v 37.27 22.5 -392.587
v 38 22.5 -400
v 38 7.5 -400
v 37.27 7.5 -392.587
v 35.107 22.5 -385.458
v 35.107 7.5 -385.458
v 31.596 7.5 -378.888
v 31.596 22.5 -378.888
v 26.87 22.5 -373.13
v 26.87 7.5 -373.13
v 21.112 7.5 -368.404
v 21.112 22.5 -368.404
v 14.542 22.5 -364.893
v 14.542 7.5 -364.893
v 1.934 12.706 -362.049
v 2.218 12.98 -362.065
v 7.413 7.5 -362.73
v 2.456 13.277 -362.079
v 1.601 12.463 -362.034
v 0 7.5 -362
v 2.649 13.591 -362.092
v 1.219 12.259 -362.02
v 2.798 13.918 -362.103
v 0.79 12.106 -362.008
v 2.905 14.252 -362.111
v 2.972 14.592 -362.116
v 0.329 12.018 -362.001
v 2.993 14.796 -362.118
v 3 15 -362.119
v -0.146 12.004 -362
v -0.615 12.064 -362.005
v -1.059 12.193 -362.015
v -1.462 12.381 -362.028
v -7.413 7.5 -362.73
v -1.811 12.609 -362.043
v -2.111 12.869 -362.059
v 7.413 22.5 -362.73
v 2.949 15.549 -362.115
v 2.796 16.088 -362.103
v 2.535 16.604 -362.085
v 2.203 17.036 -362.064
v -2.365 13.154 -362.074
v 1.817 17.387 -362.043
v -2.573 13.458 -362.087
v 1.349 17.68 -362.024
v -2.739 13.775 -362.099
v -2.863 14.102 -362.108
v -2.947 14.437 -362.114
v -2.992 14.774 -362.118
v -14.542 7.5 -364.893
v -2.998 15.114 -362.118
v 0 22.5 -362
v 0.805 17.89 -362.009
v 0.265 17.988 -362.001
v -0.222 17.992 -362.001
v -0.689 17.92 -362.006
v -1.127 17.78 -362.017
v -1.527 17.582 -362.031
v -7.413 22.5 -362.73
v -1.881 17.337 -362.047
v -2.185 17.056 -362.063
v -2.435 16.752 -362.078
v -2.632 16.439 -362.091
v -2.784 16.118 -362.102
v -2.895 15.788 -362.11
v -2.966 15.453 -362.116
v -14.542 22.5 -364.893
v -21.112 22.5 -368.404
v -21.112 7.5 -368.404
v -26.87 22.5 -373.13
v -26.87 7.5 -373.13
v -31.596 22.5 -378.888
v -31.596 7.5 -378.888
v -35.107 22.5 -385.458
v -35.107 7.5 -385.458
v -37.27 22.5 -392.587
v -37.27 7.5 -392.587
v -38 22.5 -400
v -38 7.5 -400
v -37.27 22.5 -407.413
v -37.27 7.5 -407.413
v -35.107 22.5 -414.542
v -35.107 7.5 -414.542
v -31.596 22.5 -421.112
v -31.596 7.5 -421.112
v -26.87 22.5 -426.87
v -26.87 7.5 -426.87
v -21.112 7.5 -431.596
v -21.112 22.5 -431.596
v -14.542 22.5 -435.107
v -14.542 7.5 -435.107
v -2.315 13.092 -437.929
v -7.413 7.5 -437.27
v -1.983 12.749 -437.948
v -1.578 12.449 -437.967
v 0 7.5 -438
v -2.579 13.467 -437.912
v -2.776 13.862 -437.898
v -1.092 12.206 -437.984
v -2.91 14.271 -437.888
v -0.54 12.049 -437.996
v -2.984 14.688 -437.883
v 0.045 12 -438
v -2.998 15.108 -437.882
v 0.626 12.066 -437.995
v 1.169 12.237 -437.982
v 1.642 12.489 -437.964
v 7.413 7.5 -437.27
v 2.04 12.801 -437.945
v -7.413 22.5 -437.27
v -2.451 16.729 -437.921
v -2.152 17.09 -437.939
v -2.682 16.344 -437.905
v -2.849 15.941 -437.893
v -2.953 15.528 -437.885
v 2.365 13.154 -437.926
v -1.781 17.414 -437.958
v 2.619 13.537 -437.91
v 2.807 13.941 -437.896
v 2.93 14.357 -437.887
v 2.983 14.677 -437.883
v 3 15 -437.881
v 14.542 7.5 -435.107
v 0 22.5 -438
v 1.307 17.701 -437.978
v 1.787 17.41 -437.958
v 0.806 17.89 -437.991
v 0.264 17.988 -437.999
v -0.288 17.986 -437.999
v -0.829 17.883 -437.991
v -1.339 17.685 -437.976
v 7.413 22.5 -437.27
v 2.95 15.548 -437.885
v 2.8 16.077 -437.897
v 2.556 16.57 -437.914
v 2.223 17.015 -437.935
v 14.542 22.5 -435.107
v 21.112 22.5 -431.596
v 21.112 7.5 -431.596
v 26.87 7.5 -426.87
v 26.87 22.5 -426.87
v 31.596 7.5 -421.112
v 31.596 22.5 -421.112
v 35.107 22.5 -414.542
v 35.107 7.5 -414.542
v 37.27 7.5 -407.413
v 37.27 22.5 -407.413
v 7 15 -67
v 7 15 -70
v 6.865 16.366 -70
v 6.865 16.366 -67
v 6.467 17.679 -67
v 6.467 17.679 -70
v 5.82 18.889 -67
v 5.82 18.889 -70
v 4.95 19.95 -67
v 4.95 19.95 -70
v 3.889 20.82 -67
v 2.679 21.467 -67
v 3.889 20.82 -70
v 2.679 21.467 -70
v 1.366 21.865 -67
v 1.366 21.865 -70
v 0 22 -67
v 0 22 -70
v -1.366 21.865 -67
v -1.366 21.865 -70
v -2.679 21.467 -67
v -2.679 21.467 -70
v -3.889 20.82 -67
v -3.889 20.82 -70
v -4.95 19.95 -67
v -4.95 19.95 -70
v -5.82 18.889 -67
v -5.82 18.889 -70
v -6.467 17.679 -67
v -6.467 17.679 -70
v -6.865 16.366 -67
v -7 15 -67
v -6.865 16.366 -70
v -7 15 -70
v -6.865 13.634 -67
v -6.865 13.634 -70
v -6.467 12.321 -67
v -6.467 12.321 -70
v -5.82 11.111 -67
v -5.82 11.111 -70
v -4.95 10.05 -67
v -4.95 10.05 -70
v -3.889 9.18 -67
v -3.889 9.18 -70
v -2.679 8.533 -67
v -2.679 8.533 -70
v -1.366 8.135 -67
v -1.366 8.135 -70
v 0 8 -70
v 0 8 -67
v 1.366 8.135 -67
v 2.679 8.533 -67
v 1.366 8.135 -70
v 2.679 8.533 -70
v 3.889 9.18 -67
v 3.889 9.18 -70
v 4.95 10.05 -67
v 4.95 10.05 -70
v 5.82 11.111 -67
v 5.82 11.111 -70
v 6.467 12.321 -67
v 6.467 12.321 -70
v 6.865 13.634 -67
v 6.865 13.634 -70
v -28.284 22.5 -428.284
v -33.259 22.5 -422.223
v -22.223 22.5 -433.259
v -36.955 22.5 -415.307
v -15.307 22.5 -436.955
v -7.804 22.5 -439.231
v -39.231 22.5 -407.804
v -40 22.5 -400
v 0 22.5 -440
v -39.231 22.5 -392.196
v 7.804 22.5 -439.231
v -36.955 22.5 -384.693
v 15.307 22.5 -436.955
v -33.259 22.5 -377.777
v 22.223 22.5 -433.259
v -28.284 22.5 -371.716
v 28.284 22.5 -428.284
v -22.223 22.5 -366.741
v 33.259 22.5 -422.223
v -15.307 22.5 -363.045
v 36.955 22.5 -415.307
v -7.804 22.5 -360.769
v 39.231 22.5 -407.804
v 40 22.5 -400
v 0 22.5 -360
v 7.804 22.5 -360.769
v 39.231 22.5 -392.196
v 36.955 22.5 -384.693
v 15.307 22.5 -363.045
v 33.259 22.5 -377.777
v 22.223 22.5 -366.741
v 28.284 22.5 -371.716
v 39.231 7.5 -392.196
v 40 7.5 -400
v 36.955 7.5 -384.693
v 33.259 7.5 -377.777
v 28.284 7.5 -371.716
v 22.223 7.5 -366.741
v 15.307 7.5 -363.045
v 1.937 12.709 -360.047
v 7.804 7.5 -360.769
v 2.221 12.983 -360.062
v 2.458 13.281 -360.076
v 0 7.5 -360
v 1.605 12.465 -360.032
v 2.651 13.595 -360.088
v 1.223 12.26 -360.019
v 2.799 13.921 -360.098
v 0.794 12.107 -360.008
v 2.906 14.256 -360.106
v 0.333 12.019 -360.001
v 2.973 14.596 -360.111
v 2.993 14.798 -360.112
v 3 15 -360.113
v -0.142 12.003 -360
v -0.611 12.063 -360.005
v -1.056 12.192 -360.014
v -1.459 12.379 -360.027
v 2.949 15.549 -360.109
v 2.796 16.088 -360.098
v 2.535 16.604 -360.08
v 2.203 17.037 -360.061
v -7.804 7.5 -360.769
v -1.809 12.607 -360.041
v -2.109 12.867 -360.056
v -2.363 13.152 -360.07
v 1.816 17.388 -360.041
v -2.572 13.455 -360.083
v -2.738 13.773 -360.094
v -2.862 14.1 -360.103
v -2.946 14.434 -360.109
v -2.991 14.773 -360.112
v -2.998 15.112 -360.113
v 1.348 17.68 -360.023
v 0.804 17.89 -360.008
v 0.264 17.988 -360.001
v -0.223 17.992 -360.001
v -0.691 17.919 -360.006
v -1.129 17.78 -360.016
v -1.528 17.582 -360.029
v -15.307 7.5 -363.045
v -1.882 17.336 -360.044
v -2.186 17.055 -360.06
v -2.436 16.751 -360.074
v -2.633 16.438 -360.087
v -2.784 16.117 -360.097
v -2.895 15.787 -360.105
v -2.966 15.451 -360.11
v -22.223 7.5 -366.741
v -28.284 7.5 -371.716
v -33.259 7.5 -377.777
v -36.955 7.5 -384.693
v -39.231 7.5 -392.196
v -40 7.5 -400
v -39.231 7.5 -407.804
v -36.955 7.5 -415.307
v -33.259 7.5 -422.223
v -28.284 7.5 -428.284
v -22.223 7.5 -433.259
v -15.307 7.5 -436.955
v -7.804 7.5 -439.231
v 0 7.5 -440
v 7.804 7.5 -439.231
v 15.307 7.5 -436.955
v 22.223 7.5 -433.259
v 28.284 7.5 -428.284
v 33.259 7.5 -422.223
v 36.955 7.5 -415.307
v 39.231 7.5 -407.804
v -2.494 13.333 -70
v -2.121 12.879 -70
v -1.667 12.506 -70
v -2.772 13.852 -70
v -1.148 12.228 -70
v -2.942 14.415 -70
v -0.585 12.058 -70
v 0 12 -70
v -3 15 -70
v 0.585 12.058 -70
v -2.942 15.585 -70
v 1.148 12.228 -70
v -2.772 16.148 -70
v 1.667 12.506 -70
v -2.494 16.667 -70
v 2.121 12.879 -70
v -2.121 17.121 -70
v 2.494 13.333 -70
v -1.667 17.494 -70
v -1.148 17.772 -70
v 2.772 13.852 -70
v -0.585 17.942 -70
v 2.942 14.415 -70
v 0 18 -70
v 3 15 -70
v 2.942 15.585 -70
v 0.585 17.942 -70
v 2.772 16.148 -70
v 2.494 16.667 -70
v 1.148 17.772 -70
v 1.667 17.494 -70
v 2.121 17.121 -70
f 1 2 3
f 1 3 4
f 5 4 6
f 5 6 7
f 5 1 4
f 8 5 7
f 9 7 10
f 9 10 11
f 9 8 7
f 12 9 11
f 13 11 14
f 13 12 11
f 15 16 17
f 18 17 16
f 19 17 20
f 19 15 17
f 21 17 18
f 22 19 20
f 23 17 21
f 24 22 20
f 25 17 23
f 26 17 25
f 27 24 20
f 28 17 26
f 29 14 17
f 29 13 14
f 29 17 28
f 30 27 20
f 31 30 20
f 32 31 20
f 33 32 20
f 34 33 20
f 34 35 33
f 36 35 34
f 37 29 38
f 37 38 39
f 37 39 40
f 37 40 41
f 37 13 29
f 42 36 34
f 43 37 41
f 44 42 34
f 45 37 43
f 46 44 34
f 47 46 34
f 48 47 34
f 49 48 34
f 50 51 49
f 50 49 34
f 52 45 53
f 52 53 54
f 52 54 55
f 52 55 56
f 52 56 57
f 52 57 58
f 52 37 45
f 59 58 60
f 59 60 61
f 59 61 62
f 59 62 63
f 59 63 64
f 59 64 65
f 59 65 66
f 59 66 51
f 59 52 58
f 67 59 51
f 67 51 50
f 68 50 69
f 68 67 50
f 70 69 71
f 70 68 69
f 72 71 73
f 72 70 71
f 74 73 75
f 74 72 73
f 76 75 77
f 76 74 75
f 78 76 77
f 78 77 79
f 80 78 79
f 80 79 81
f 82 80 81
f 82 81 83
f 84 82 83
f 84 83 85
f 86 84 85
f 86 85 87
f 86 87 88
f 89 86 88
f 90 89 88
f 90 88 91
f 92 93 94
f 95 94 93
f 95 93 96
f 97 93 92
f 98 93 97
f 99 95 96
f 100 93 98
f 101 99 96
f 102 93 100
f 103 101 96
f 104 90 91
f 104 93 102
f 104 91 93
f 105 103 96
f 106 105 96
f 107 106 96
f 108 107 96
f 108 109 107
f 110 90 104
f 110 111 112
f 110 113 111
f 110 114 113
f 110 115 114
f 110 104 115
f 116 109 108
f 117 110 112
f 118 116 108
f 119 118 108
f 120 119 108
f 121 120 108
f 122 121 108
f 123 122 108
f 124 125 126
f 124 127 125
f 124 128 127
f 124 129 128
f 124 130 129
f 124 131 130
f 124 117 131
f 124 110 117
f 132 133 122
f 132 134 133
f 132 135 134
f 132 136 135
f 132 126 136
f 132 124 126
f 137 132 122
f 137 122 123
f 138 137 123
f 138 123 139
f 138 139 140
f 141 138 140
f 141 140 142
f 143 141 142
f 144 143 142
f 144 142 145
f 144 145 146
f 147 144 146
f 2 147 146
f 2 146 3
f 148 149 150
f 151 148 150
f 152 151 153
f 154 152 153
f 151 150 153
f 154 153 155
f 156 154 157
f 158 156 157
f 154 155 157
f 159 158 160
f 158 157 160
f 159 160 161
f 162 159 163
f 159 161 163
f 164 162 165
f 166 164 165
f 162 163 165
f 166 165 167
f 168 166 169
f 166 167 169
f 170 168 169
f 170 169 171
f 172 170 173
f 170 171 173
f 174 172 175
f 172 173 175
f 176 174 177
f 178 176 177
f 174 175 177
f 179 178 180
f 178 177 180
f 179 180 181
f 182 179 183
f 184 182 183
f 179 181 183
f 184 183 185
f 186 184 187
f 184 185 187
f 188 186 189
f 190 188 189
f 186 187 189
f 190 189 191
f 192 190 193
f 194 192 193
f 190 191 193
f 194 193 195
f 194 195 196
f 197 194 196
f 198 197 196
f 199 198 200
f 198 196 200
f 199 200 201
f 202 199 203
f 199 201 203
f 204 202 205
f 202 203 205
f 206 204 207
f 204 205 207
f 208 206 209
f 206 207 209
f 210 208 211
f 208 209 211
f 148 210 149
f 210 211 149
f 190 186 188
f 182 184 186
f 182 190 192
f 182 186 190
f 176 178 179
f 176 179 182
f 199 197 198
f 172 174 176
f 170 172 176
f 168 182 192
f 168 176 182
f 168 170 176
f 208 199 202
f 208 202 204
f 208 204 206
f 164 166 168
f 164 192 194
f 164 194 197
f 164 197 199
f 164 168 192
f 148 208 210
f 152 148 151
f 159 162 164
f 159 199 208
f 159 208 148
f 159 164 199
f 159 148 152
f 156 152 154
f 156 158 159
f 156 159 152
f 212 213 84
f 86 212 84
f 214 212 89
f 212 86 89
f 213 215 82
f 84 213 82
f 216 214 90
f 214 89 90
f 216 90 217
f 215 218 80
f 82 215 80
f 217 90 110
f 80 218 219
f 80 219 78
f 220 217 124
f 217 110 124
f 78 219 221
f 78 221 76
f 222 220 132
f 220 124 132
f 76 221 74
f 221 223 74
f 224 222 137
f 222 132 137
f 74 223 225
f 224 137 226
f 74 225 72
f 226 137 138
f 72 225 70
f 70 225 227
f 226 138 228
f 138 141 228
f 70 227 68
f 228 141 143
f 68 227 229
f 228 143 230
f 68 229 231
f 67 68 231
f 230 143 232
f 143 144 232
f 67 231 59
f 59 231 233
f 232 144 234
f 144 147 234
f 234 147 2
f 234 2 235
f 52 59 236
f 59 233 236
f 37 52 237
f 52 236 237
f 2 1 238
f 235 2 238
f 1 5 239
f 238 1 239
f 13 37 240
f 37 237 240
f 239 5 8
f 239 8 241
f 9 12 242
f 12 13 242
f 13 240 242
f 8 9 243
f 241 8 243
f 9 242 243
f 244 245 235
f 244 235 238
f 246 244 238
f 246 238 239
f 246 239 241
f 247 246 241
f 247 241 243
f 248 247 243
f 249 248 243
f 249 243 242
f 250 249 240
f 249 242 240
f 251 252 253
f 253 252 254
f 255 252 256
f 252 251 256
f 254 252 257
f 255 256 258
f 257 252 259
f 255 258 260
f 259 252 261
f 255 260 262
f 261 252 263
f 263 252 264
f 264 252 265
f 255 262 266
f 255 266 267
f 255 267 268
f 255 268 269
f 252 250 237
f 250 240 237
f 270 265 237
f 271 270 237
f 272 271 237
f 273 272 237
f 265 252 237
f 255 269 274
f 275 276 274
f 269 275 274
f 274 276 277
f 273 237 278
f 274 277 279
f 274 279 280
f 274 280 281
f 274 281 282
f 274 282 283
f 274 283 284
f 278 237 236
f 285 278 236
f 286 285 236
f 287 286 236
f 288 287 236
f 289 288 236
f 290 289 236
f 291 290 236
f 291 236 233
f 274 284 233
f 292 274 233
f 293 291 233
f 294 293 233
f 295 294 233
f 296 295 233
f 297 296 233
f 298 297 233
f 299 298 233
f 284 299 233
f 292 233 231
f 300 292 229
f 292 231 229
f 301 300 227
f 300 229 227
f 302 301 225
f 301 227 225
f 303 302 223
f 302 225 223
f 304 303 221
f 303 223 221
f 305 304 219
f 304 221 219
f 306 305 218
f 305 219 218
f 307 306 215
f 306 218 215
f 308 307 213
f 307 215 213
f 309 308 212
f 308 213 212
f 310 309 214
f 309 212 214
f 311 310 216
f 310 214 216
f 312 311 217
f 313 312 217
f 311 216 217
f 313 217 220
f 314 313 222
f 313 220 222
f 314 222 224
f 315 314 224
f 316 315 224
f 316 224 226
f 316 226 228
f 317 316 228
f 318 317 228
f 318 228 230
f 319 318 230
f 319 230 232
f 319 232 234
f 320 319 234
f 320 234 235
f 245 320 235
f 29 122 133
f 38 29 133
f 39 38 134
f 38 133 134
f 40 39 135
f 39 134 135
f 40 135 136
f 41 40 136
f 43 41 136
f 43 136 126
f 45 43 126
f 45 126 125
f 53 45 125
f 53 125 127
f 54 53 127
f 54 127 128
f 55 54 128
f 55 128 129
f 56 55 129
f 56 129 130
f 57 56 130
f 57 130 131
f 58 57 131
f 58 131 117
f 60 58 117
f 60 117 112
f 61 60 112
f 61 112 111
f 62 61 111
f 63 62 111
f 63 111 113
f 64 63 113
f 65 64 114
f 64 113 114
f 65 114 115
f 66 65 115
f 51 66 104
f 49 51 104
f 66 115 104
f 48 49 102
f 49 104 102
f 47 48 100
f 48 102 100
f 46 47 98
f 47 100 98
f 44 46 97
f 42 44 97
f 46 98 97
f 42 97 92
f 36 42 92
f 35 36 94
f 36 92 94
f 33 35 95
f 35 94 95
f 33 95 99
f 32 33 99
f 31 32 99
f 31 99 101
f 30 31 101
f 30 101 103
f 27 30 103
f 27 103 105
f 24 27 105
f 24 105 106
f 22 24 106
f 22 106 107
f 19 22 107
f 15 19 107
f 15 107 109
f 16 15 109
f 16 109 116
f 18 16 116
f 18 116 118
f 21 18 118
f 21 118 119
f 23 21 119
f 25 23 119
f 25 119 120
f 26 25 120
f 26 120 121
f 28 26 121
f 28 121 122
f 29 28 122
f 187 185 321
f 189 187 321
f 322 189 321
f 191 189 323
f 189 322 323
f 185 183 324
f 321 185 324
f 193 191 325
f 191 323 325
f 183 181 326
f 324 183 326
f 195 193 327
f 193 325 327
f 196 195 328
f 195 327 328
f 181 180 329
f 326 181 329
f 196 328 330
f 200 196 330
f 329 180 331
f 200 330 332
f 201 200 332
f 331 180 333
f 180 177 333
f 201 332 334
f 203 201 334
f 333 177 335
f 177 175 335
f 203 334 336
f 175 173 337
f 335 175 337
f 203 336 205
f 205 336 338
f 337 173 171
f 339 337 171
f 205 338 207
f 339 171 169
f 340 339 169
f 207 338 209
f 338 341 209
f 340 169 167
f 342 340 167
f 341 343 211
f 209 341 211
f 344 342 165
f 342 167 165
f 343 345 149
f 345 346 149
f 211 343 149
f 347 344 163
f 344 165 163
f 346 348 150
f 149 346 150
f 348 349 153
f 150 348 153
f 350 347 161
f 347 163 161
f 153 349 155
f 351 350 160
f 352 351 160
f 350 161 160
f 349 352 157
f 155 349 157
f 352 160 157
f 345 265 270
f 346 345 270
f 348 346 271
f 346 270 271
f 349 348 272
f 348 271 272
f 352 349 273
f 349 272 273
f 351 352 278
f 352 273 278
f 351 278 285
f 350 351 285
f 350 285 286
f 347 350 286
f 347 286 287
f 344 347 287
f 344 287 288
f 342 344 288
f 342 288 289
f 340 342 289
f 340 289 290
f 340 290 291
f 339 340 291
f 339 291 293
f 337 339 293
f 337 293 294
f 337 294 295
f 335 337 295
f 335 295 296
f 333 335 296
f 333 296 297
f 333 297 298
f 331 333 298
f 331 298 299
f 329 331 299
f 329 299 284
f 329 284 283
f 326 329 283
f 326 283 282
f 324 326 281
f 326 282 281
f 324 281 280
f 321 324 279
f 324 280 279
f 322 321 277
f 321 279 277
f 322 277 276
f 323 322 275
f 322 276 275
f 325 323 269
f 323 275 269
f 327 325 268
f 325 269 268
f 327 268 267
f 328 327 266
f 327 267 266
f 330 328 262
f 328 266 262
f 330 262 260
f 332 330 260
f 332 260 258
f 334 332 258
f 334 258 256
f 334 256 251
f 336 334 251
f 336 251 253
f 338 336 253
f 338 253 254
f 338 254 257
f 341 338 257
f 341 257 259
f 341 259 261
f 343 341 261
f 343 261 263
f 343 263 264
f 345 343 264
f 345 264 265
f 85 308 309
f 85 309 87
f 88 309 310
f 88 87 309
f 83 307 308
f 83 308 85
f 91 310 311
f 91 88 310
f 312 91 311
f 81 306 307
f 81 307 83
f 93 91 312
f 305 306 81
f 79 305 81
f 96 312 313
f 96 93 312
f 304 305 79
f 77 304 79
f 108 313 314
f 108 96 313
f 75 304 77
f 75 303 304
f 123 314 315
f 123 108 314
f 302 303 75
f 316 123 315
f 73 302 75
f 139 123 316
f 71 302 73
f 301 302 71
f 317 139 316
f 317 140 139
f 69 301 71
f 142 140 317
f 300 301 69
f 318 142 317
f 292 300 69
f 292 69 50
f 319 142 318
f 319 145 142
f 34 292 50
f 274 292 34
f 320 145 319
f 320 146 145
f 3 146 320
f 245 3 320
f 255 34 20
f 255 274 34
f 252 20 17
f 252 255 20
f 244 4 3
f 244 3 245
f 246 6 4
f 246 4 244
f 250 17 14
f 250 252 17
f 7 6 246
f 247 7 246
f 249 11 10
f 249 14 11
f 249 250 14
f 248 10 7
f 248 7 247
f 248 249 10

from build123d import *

# Parameters (mm, degrees)
CYLINDER040_R     = 3
CYLINDER040_DEPTH = 372
CYLINDER041_R     = 7
CYLINDER041_DEPTH = 3
TUBE004_R         = 40
TUBE004_R_2       = 38
TUBE004_DEPTH     = 15


with BuildPart() as pendulumshaft:
    # Cylinder040 → Cylinder040 (new body)
    with BuildSketch(Plane(origin=(0, 15, -439), x_dir=(1, 0, 0), z_dir=(0, 0, 1))):
        Circle(CYLINDER040_R)
    extrude(amount=CYLINDER040_DEPTH)


with BuildPart() as pendulumclampplate:
    # Cylinder041 → Cylinder041 (new body)
    with BuildSketch(Plane(origin=(0, 15, -70), x_dir=(1, 0, 0), z_dir=(0, 0, 1))):
        Circle(CYLINDER041_R)
    extrude(amount=CYLINDER041_DEPTH)


with BuildPart() as pendulum001:
    # Tube004 → Tube004 (new body)
    with BuildSketch(Plane(origin=(0, 22.5, -400), x_dir=(1, 0, 0), z_dir=(0, -1, 0))):
        Circle(TUBE004_R)
        Circle(TUBE004_R_2, mode=Mode.SUBTRACT)
    extrude(amount=TUBE004_DEPTH)

    # Fusion: union PendulumShaft, PendulumClampPlate
    add(pendulumshaft.part)
    add(pendulumclampplate.part)


solid = pendulum001.part
